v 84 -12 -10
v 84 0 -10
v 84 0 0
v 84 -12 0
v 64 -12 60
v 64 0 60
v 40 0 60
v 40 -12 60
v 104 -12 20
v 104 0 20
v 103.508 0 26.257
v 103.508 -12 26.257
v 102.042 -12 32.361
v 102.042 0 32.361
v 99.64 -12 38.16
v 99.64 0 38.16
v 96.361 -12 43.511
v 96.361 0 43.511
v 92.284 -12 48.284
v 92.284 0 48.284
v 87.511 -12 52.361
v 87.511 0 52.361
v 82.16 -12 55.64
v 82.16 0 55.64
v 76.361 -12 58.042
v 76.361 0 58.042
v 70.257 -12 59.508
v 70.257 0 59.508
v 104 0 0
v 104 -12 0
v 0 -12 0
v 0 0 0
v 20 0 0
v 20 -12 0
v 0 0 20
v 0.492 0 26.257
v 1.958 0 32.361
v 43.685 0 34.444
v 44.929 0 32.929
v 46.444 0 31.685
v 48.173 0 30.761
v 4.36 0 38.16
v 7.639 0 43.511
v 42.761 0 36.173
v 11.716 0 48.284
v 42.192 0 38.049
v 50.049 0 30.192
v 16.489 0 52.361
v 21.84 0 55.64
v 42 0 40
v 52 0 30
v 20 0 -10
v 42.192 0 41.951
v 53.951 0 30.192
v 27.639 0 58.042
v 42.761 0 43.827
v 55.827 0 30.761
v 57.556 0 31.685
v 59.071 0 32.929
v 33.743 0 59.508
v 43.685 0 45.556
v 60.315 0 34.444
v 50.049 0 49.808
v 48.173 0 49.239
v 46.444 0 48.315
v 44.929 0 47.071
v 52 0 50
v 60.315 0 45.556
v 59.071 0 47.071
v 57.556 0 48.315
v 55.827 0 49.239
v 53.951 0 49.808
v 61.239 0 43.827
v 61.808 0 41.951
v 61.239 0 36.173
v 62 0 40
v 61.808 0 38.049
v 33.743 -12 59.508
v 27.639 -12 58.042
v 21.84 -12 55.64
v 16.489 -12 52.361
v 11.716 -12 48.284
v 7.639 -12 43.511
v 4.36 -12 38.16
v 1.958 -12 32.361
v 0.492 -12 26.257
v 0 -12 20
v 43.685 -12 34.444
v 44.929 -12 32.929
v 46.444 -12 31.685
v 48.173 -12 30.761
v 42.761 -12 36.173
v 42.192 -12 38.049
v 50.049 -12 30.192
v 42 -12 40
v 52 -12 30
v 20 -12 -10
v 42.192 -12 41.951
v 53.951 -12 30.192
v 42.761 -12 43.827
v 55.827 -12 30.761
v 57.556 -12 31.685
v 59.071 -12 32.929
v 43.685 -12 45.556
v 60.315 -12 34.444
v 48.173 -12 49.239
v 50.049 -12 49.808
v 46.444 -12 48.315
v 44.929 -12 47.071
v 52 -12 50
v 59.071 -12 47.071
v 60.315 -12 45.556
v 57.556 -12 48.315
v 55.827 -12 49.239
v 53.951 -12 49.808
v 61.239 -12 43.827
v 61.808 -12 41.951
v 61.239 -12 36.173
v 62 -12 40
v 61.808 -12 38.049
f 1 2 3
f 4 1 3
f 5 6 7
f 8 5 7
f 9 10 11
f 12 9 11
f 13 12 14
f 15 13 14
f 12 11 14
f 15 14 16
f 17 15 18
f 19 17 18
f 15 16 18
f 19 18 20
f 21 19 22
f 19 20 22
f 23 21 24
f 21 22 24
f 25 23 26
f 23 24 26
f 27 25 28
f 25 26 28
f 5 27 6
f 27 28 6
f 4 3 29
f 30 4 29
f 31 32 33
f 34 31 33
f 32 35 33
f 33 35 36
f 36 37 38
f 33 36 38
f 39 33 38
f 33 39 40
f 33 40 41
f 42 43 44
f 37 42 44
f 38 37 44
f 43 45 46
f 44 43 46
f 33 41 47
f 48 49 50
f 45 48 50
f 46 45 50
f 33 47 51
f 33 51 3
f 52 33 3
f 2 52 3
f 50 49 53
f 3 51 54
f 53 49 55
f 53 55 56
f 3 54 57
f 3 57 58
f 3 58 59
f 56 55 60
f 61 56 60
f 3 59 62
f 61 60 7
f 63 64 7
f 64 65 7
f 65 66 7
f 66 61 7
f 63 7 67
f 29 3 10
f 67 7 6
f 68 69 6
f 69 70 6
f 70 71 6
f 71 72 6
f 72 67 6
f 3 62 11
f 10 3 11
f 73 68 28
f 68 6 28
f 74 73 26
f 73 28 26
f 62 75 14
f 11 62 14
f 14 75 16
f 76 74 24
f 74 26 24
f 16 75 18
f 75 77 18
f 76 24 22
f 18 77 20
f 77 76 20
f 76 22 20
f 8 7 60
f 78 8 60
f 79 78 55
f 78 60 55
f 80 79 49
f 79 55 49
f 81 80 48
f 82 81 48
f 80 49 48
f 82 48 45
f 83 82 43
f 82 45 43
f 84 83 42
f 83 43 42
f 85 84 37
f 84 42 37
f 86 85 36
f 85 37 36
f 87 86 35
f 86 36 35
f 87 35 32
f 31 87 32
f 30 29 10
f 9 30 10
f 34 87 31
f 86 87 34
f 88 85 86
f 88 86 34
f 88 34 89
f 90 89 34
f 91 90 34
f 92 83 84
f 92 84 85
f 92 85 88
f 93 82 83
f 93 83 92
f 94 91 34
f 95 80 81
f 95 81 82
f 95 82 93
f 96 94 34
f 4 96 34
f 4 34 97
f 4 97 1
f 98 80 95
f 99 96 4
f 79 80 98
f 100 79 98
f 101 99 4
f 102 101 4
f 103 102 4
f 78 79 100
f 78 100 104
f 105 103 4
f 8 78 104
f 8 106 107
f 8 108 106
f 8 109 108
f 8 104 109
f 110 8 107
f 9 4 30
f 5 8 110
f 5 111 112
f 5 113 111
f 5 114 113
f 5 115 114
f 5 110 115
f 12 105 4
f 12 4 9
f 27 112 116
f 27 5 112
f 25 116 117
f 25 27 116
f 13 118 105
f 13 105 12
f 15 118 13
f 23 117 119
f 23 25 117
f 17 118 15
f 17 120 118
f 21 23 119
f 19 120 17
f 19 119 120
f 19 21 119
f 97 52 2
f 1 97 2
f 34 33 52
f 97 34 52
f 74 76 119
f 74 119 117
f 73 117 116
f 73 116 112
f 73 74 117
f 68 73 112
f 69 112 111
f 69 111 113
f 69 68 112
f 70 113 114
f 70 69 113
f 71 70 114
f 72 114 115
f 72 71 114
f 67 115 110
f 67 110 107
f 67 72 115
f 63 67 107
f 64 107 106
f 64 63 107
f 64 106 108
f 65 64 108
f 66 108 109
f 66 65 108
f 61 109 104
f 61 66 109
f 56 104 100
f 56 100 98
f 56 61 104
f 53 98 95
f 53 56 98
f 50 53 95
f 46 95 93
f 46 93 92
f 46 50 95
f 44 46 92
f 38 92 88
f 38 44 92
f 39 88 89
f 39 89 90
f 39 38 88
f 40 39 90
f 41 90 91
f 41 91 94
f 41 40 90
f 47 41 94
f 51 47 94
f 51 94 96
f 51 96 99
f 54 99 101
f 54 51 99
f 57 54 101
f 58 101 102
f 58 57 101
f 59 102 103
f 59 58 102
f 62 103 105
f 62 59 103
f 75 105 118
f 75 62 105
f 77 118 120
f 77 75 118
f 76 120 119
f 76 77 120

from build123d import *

# Parameters (mm, degrees)
F0_R     = 10
F1_DEPTH = 12


with BuildPart() as f1:
    # F0 (on Front) → F1 (new body)
    with BuildSketch(Plane.XZ):
        with BuildLine():
            Line((0, 20), (0, 0))
            Line((0, 0), (20, 0))
            Line((20, 0), (20, -10))
            Line((20, -10), (84, -10))
            Line((84, -10), (84, 0))
            Line((84, 0), (104, 0))
            Line((104, 0), (104, 20))
            ThreePointArc((104, 20), (92.284271, 48.284271), (64, 60))
            Line((64, 60), (40, 60))
            ThreePointArc((40, 60), (11.715729, 48.284271), (0, 20))
        make_face()
        with Locations((52, 40)):
            Circle(F0_R, mode=Mode.SUBTRACT)
    extrude(amount=F1_DEPTH)


solid = f1.part
